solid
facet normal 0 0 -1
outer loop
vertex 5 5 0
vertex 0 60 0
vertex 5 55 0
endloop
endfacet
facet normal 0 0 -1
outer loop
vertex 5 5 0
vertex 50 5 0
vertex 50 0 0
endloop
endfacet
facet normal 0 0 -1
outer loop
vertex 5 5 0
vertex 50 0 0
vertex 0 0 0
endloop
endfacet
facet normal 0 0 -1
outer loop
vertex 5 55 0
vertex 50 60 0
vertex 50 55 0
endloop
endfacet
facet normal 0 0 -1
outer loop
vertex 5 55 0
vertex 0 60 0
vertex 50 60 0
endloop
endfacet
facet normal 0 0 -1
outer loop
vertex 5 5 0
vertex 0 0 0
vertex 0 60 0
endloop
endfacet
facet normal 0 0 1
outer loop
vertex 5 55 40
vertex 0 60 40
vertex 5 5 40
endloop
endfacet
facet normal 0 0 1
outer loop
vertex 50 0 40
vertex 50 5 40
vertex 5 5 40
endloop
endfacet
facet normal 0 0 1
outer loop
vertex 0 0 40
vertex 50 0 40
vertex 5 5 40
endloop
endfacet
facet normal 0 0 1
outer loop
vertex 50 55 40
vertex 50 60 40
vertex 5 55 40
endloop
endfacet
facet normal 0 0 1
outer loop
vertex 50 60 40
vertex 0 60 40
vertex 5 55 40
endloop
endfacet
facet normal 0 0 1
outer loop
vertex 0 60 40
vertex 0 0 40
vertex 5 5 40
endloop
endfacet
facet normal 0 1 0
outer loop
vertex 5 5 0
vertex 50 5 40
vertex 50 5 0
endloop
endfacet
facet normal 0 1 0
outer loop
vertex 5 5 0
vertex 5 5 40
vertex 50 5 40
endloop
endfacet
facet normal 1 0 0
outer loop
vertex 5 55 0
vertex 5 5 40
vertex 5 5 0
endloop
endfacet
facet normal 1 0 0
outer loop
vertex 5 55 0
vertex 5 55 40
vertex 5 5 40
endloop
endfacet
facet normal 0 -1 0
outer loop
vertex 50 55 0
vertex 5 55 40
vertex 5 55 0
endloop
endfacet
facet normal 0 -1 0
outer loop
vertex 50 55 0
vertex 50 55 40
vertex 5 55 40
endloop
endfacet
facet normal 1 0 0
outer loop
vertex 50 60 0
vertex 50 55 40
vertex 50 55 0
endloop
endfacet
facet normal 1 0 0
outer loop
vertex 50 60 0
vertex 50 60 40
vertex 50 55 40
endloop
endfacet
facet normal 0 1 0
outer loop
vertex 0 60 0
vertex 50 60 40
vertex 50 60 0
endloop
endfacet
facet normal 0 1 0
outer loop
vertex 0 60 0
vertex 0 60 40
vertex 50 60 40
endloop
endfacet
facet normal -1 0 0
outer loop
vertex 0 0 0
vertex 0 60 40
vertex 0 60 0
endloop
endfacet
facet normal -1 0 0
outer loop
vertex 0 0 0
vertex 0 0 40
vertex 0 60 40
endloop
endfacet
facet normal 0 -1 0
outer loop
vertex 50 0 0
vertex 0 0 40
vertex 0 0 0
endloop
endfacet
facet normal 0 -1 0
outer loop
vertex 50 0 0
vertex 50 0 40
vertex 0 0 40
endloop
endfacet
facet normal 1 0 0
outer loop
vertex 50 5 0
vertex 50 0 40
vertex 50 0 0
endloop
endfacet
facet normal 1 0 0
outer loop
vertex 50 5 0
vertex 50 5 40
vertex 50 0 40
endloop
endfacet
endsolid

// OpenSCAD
$fn = 32;

// ----------------------------------------------------------------------
// Structural section: channel 50 x 60 mm
// ----------------------------------------------------------------------

// --- parameters (mm) ---
sec_w = 50;               // channel width, X
sec_h = 60;               // channel height, Y
flange_t = 5;             // flange thickness
web_t = 5;                // web thickness
plate_t = 40;             // cut length, Z (extrusion height)

profile = [[0, 0], [50, 0], [50, 5], [5, 5], [5, 55], [50, 55], [50, 60], [0, 60]];  // primary outline, 8 points, counter clockwise

// --- the one profile operation ---
linear_extrude(height = plate_t) polygon(points = profile);
